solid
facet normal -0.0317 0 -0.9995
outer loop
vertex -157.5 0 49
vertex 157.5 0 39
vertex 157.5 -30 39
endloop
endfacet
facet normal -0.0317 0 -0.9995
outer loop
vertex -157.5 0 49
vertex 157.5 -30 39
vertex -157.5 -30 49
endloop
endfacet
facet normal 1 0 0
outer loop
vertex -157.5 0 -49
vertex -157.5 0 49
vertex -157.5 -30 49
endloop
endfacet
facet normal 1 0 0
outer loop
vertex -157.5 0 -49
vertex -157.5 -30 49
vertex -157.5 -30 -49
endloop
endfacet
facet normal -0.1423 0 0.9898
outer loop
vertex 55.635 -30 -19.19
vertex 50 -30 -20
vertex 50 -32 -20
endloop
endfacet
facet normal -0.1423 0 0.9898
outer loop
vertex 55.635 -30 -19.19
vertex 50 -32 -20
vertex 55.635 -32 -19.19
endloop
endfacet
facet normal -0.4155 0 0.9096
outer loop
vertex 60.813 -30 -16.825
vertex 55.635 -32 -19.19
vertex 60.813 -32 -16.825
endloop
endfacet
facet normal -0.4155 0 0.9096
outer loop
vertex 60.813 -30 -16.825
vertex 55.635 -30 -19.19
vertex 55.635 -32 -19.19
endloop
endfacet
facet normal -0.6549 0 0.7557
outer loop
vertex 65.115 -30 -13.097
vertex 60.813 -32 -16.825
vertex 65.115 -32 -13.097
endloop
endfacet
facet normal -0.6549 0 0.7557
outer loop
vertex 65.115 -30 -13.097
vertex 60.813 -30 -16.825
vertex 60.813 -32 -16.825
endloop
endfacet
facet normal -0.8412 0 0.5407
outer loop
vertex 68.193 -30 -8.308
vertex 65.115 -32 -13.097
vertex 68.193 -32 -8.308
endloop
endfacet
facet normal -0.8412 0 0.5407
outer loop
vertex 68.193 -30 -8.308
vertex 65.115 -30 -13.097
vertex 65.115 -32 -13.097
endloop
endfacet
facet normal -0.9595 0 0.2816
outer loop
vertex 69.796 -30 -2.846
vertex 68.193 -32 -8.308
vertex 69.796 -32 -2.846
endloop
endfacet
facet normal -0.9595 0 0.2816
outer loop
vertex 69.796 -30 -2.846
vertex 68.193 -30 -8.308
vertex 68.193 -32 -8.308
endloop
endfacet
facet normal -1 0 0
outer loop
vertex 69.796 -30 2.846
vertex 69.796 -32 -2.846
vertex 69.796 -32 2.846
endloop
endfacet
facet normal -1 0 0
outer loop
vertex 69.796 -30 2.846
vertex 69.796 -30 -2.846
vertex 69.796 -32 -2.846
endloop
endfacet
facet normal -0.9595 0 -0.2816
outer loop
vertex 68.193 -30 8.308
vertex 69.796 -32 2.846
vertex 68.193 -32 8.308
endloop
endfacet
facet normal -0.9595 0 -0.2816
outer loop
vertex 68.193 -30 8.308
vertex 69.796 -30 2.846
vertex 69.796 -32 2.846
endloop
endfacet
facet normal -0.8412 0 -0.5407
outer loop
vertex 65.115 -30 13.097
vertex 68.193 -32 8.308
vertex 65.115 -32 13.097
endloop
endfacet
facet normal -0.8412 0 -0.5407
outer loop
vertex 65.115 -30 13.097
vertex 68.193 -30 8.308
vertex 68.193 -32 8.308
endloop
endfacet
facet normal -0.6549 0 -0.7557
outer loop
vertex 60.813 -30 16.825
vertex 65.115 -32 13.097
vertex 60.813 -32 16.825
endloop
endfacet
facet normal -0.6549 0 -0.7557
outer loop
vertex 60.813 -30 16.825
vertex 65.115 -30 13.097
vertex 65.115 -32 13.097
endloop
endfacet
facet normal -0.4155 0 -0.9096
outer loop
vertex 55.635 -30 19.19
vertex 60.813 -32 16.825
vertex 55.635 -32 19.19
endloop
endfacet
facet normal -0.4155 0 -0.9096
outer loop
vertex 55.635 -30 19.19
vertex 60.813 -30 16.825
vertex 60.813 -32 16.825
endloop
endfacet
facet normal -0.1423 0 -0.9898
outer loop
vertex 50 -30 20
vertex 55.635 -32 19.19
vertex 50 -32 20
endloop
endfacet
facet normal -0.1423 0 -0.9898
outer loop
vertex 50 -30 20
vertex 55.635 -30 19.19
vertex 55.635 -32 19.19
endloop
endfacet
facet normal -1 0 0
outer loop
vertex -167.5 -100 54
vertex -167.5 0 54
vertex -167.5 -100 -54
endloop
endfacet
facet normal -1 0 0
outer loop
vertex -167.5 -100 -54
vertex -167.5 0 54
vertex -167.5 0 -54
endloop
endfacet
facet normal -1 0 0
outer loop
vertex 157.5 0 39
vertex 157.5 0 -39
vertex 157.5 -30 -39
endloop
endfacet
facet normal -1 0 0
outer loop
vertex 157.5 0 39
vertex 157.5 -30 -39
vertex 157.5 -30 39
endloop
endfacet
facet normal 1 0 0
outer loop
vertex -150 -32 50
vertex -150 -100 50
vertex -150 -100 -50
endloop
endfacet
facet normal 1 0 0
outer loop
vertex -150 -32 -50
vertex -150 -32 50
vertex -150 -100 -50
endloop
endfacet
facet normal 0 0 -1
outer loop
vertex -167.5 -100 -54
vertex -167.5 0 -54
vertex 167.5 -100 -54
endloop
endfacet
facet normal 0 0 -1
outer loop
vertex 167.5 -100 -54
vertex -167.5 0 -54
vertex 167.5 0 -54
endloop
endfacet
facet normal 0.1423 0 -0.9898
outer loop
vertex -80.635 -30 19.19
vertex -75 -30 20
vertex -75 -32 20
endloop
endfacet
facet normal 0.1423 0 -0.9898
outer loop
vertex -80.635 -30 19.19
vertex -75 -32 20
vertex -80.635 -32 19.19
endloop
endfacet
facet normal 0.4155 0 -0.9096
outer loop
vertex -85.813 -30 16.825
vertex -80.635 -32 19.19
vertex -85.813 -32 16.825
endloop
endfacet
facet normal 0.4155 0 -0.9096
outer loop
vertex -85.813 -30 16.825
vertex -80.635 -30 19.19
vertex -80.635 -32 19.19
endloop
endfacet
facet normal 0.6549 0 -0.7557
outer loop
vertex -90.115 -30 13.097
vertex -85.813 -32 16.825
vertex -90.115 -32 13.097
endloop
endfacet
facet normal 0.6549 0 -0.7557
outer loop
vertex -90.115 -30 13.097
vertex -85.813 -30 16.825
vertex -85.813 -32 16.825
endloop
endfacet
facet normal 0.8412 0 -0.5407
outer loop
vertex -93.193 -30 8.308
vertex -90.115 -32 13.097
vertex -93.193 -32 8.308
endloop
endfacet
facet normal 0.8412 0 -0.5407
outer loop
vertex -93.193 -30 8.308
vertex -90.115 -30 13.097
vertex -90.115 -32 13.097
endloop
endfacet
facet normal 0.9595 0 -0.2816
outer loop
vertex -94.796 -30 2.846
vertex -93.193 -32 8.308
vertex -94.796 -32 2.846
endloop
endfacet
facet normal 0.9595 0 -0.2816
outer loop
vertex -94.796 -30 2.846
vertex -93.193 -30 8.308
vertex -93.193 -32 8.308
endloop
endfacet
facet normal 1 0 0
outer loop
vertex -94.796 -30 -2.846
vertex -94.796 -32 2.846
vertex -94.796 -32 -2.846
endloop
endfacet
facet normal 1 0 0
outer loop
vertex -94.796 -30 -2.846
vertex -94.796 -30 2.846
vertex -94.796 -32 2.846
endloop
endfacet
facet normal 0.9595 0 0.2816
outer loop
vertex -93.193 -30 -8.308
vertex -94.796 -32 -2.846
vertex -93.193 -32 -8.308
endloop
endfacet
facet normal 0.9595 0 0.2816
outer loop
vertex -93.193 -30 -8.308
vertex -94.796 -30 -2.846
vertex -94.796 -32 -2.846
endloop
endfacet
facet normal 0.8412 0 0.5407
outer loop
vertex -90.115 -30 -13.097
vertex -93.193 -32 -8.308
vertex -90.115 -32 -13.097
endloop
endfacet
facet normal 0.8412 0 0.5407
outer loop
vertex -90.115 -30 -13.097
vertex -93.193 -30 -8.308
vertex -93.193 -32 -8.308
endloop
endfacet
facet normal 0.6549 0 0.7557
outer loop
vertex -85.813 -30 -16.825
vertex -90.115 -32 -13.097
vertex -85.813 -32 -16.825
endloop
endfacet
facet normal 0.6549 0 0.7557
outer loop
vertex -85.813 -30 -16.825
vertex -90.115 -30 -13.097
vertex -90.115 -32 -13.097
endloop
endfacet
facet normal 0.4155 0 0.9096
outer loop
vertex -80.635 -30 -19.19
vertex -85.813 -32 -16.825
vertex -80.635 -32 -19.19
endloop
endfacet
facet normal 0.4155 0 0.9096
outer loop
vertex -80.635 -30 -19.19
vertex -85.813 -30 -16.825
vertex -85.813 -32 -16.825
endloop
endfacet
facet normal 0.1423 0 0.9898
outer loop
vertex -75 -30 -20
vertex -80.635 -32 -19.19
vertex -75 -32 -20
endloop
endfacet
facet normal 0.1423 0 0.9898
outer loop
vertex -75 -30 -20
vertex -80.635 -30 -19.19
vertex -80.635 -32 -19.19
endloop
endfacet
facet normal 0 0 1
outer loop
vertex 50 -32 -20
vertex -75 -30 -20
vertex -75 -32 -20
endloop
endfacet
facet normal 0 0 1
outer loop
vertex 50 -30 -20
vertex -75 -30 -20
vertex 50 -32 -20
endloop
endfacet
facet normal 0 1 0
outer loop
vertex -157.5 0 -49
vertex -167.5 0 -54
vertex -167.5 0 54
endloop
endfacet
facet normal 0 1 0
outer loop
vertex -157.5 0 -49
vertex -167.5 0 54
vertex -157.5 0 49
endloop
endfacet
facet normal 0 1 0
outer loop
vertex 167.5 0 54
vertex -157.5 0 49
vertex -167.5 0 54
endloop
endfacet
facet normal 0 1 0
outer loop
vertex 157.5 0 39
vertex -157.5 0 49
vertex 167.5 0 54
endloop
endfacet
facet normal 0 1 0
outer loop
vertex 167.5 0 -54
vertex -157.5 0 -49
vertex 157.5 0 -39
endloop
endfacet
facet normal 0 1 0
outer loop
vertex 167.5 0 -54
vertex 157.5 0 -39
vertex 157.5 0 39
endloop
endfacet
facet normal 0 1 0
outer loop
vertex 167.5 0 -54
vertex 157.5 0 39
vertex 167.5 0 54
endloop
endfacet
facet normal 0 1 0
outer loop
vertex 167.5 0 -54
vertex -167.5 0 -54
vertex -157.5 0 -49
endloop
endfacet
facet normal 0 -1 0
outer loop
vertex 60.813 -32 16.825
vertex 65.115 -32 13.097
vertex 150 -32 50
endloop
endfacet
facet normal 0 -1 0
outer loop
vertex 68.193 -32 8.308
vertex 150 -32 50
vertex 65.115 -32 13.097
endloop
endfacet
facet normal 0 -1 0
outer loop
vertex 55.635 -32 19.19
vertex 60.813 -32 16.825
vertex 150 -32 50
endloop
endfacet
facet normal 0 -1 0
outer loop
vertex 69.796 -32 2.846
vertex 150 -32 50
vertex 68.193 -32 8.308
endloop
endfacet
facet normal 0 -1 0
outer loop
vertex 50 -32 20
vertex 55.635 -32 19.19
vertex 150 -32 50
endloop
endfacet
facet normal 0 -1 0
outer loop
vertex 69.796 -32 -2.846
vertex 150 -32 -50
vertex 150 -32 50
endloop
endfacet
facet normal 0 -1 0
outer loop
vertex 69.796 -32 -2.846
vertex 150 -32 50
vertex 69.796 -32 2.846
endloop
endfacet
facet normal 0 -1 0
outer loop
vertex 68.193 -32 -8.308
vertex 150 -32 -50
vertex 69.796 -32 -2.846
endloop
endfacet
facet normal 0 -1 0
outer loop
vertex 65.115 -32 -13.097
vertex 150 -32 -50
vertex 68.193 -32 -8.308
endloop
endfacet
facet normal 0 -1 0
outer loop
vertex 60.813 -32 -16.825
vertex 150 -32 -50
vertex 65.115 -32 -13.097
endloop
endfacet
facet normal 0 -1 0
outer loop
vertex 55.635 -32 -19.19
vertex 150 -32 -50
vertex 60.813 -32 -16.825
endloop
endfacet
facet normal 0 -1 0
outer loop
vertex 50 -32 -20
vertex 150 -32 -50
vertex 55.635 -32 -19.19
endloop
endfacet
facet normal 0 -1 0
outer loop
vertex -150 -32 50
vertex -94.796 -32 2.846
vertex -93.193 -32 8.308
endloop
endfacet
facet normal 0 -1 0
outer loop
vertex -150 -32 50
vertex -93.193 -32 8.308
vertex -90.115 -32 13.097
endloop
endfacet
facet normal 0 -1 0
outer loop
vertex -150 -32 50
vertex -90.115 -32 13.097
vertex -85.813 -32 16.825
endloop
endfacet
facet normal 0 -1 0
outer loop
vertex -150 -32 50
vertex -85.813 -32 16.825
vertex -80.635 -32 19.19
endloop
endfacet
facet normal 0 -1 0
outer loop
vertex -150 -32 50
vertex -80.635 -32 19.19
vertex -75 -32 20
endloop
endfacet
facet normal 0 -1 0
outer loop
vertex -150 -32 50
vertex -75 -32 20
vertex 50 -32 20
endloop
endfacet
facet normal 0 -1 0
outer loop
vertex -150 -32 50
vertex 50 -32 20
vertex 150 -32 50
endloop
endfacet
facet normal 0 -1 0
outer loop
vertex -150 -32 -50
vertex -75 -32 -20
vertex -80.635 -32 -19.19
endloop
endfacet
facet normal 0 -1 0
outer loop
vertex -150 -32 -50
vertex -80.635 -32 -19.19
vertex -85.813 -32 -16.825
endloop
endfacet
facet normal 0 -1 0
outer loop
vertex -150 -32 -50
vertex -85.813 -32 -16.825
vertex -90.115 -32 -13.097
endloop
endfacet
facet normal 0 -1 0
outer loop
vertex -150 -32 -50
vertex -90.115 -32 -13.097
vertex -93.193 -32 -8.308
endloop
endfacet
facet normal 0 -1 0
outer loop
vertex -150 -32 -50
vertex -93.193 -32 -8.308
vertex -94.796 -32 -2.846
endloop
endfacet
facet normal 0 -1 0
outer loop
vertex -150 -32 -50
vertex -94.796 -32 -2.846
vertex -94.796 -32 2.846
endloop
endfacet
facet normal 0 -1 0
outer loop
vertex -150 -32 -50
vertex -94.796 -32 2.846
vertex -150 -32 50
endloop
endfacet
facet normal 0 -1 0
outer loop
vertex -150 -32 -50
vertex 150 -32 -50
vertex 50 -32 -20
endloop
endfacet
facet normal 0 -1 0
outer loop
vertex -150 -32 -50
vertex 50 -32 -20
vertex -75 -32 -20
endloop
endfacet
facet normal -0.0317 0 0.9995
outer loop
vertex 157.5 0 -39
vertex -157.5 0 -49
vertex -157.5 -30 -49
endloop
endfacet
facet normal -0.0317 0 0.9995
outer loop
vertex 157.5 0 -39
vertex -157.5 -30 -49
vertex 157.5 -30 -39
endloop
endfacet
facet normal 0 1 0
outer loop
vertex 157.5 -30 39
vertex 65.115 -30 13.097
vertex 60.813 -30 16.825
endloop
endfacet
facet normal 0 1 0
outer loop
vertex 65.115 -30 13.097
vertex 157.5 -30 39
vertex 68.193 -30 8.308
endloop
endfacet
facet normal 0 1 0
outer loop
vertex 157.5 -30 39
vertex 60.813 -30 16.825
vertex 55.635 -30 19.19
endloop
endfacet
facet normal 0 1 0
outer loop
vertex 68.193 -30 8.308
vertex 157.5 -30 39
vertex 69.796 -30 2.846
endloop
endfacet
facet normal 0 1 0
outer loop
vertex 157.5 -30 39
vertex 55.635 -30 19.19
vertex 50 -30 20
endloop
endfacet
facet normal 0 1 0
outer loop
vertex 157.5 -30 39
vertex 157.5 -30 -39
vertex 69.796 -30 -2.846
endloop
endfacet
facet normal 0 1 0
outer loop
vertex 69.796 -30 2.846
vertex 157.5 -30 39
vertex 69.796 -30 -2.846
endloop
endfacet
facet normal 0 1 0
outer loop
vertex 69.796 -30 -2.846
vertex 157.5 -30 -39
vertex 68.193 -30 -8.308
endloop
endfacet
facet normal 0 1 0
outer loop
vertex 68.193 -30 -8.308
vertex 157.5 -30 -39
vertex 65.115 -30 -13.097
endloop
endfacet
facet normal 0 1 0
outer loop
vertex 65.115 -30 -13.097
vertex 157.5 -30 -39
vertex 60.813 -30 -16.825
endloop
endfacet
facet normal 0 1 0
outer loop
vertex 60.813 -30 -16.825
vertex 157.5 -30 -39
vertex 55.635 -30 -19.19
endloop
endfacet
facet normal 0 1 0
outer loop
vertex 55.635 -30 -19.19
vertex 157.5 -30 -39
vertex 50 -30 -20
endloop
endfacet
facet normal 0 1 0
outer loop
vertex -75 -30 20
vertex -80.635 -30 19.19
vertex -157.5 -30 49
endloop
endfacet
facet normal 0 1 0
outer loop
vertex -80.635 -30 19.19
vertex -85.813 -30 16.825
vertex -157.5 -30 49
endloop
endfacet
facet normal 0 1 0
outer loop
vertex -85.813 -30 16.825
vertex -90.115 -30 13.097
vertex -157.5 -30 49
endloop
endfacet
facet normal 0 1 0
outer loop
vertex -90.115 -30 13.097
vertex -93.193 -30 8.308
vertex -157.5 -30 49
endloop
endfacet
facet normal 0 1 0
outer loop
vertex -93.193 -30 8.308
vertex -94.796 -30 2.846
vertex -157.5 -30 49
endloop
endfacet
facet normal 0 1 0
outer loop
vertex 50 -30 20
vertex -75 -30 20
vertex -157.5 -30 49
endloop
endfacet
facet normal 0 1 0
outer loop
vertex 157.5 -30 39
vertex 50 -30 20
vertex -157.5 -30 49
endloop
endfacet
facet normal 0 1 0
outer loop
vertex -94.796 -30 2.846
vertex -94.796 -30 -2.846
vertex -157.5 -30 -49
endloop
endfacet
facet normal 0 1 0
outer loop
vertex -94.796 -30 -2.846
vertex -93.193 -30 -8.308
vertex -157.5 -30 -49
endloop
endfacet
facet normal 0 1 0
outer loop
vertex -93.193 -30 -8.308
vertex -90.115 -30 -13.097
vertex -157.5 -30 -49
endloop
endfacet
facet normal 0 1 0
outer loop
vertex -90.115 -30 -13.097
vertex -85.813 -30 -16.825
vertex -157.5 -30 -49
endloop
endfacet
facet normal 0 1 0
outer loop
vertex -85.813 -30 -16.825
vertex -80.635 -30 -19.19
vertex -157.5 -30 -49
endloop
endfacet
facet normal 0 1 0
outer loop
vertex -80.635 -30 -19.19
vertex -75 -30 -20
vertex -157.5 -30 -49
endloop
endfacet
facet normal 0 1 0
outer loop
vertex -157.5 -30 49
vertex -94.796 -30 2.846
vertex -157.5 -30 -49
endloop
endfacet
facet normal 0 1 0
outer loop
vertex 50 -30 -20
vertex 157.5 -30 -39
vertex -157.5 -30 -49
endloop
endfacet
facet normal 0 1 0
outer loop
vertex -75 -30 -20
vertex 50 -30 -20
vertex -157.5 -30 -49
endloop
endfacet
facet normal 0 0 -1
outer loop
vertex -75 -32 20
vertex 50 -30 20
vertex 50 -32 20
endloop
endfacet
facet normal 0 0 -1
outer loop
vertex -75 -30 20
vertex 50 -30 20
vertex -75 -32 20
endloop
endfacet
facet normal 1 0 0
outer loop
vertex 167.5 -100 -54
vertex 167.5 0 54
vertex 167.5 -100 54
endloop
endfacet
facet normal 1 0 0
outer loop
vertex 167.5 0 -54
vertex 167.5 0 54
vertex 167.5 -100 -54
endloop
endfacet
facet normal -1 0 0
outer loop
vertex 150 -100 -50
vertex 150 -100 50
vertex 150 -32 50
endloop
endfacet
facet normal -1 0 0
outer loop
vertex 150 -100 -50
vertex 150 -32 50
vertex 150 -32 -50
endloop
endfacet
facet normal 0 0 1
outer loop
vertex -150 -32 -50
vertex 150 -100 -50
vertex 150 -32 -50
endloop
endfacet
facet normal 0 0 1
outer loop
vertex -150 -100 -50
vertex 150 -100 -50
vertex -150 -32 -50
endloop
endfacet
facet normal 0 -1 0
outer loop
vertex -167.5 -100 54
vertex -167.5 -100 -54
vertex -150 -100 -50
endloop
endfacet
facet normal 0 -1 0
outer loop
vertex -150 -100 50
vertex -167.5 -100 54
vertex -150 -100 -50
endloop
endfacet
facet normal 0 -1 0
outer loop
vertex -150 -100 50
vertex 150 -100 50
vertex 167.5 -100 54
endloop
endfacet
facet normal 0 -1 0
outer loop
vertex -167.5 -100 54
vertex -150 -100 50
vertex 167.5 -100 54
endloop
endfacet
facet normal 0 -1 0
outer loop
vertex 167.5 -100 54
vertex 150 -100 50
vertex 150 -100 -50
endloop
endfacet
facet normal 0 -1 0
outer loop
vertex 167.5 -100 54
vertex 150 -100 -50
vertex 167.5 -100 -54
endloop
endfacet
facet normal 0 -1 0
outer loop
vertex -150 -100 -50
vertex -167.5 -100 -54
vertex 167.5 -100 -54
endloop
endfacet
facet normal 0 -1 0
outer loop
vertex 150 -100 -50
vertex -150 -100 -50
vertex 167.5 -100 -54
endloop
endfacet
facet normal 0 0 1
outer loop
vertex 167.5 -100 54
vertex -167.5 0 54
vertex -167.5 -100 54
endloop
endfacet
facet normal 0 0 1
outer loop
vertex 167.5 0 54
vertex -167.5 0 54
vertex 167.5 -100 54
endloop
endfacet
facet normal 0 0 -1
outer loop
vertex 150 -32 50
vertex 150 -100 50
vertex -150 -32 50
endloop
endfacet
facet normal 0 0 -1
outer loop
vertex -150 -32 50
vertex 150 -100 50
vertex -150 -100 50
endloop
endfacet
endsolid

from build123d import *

# Parameters (mm, degrees)
SKETCH2_W           = 335
SKETCH2_H           = 108
BOSS_EXTRUDE4_DEPTH = 100
CUT_EXTRUDE1_DEPTH  = 30
SKETCH4_W           = 300
SKETCH4_H           = 100
CUT_EXTRUDE2_DEPTH  = 68
CUT_EXTRUDE3_DEPTH  = 31


with BuildPart() as part:
    # Sketch2 → Boss-Extrude4 (new body)
    with BuildSketch(Plane(origin=(0, 0, 0), x_dir=(1, 0, 0), z_dir=(0, 1, 0))):
        Rectangle(SKETCH2_W, SKETCH2_H)
    extrude(amount=-BOSS_EXTRUDE4_DEPTH)

    # Sketch3 → Cut-Extrude1 (cut)
    with BuildSketch(Plane(origin=(0, 0, 0), x_dir=(1, 0, 0), z_dir=(0, 1, 0))):
        Polygon((-157.5, -49), (-157.5, 49), (157.5, 39), (157.5, -39), align=None)
    extrude(amount=-CUT_EXTRUDE1_DEPTH, mode=Mode.SUBTRACT)

    # Sketch4 → Cut-Extrude2 (cut)
    with BuildSketch(Plane(origin=(0, -100, 0), x_dir=(-1, 0, 0), z_dir=(0, -1, 0))):
        Rectangle(SKETCH4_W, SKETCH4_H)
    extrude(amount=-CUT_EXTRUDE2_DEPTH, mode=Mode.SUBTRACT)

    # Sketch5 → Cut-Extrude3 (cut)
    with BuildSketch(Plane(origin=(0, -30, 0), x_dir=(1, 0, 0), z_dir=(0, 1, 0))):
        with BuildLine():
            Line((-75, 20), (50, 20))
            ThreePointArc((50, 20), (70, 0), (50, -20))
            Line((50, -20), (-75, -20))
            ThreePointArc((-75, -20), (-95, 0), (-75, 20))
        make_face()
    extrude(amount=-CUT_EXTRUDE3_DEPTH, mode=Mode.SUBTRACT)


solid = part.part
